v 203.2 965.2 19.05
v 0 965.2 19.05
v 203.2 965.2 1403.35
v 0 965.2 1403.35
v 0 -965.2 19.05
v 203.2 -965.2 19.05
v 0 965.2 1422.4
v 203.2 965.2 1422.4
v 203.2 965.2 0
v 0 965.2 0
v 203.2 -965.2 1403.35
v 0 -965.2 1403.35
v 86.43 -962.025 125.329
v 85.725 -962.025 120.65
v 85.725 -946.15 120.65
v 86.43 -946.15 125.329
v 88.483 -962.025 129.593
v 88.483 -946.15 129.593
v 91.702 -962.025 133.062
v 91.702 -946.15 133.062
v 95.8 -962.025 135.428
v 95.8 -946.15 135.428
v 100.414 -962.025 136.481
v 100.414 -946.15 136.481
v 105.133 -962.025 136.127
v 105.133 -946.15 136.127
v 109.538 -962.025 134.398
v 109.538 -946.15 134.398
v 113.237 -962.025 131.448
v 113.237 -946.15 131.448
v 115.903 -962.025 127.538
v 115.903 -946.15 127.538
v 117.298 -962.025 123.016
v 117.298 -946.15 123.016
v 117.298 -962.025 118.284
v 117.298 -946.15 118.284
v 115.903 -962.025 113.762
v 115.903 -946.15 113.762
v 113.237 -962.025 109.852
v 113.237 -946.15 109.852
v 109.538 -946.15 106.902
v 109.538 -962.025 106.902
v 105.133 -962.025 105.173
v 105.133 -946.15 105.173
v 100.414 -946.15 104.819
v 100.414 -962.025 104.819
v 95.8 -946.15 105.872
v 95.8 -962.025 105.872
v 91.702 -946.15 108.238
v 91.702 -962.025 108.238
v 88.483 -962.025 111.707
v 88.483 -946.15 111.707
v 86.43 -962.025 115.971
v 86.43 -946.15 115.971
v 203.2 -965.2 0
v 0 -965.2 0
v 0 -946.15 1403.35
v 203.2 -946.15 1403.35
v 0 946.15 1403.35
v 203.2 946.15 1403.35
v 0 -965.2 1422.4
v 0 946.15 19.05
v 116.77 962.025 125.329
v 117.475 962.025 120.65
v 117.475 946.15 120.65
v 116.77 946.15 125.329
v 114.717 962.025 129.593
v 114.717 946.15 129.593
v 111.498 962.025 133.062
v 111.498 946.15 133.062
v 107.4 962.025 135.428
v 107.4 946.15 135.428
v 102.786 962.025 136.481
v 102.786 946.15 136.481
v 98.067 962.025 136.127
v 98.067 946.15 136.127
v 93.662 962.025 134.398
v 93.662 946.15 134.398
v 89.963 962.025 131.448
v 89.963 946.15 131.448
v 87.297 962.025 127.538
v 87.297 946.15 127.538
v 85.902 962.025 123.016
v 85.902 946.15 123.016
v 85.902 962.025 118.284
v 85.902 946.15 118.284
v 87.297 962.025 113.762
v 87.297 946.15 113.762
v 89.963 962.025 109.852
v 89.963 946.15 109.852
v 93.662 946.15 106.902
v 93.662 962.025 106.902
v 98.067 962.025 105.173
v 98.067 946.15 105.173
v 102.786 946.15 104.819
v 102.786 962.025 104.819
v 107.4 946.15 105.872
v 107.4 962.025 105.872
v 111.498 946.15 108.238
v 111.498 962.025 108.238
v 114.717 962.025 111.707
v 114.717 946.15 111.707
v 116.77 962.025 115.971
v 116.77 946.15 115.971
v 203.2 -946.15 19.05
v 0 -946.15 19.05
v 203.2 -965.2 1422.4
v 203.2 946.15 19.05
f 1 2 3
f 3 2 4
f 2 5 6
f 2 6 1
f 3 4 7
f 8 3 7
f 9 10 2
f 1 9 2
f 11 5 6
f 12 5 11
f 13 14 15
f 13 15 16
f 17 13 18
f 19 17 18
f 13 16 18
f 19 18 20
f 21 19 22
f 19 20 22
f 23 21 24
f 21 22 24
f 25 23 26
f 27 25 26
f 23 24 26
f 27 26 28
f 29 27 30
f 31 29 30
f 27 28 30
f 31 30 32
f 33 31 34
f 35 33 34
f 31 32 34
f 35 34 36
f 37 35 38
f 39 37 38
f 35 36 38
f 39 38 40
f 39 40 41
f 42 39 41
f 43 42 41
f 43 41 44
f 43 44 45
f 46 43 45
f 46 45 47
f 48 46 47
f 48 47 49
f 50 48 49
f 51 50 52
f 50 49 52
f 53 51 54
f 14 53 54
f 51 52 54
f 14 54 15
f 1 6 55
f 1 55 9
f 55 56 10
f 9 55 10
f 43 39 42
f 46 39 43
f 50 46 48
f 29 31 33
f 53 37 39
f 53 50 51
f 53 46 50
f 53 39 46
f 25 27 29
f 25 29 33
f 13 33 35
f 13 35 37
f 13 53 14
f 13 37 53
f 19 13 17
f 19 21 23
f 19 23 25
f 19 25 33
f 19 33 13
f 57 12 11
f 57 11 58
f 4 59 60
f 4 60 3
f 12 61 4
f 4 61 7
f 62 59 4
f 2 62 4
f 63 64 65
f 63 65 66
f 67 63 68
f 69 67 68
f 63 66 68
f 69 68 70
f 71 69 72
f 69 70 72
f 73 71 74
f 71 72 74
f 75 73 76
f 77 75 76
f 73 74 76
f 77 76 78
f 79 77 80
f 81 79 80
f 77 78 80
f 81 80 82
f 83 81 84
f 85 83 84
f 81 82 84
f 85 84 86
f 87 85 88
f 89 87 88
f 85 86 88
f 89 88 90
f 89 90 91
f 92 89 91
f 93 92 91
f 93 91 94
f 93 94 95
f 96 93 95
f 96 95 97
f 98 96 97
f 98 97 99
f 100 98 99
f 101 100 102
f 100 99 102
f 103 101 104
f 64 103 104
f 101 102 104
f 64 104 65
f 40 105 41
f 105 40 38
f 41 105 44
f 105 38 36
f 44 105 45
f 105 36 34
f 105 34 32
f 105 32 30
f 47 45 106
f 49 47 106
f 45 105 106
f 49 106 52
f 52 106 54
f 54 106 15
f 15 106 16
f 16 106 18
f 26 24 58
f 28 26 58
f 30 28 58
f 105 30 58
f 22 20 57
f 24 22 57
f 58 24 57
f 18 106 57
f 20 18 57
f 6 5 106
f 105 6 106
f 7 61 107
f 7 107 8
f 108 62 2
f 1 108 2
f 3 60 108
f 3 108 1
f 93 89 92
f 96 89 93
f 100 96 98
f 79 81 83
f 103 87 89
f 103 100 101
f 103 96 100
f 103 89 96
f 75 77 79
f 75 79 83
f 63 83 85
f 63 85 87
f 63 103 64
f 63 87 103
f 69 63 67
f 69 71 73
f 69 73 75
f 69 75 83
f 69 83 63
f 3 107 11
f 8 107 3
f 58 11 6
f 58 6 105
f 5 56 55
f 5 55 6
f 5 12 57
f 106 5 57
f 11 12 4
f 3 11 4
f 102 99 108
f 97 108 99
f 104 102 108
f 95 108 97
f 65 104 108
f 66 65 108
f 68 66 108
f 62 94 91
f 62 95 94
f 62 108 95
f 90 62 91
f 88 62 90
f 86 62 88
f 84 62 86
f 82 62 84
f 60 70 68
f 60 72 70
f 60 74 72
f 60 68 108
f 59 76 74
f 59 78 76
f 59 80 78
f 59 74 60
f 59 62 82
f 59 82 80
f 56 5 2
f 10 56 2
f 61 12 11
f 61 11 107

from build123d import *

# Parameters (mm, degrees)
F0_W     = 1930.4
F0_H     = 19.05
F1_DEPTH = 203.2
F2_W     = 19.05
F2_H     = 1384.3
F3_DEPTH = 203.2
F4_R     = 15.875
F5_DEPTH = 15.875
F6_R     = 15.875
F7_DEPTH = 15.875


with BuildPart() as f1:
    # F0 (on Right) → F1 (new body)
    with BuildSketch(Plane.YZ):
        with Locations((0, 9.525)):
            Rectangle(F0_W, F0_H)
        with Locations((0, 1412.875)):
            Rectangle(F0_W, F0_H)
    extrude(amount=F1_DEPTH)


with BuildPart() as f3:
    # F2 (on Right) → F3 (new body, through all)
    with BuildSketch(Plane.YZ):
        with Locations((-955.675, 711.2)):
            Rectangle(F2_W, F2_H)
        with Locations((955.675, 711.2)):
            Rectangle(F2_W, F2_H)
    extrude(amount=F3_DEPTH)

    # F4 (on face) → F5 (cut)
    with BuildSketch(Plane(origin=(0, -946.15, 0), x_dir=(-1, 0, 0), z_dir=(0, 1, 0))):
        with Locations((-101.6, 120.65)):
            Circle(F4_R)
    extrude(amount=-F5_DEPTH, mode=Mode.SUBTRACT)

    # F6 (on face) → F7 (cut)
    with BuildSketch(Plane.XZ.offset(-946.15)):
        with Locations((101.6, 120.65)):
            Circle(F6_R)
    extrude(amount=-F7_DEPTH, mode=Mode.SUBTRACT)


solid = Compound([f1.part, f3.part])
